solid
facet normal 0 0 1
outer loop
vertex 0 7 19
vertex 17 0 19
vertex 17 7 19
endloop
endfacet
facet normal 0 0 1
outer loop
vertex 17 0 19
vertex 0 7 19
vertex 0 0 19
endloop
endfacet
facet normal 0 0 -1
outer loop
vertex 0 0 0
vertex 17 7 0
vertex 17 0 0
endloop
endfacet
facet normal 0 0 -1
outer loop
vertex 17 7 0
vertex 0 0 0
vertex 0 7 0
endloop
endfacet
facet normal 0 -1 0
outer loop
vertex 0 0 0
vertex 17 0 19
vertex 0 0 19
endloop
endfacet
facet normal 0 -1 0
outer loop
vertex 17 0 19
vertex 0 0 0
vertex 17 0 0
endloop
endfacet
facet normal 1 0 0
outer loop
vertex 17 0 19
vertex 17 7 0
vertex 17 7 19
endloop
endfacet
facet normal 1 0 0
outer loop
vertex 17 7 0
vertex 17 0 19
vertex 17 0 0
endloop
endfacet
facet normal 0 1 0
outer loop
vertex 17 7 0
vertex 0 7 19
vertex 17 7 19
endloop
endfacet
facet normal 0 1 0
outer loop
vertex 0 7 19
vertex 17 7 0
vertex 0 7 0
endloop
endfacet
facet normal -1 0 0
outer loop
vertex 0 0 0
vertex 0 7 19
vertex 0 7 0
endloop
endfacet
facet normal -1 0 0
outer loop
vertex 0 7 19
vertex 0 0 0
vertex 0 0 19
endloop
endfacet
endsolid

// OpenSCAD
// Generated by SolidPython 1.0.1 on 2020-07-29 00:46:56


cube(size = [17, 7, 19]);
/***********************************************
*********      SolidPython code:      **********
************************************************
 
# import packages: SolidPython
from solid import *
from solid.utils import *
from itertools import chain, combinations, permutations


class Resize:

    def __init__(self, scad_file):
        self.scad_file = scad_file
        #self.scad_file = import_scad(scad_file)
        # cone/cylinder param:
        self.r1 = 0
        self.r2 = 0
        self.h = 0
        # rectangular prism param:
        self.w = 0
        self.l = 0
        # ellipse param:
        self.r = 0

    # import OpenScad code (file name corresponds to shape)


    # classify shape + parameters
    def assign(self, param1, param2, param3):
        if self.scad_file == 'cone.scad':
            self.r1 = param1
            self.r2 = param2
            self.h = param3
        elif self.scad_file == 'cylinder.scad':
            self.r1 = param1
            self.r2 = param2
            self.h = param3
        elif self.scad_file == 'rectangularPrism.scad':
            self.h = param1
            self.l = param2
            self.w = param3
        else:
            self.r = param1
            self.h = param2

    # resize parameters
    def iterate(self):
        x = range(3, 20, 2)
        i = 1
        if self.scad_file == 'cone.scad':
            tempList = list(permutations(x, 2))
            for temp in tempList:
                param1 = temp[0]
                param2 = temp[1]
                filepath = 'produced_scad_files/' + 'cone' + str(param1) + '_' + str(param2) + '_' + '.scad'
                scad_render_to_file(cylinder(h=param1, r1=param2, r2=0), filepath)

        elif self.scad_file == 'cylinder.scad':
            tempList = list(permutations(x, 3))
            for temp in tempList:
                param1 = temp[0]
                param2 = temp[1]
                filepath = 'produced_scad_files/' + 'cylinder' + str(param1) + '_' + str(param2) + '_' + '.scad'
                scad_render_to_file(cylinder(h=param1, r1=param2, r2=param2), filepath)

        elif self.scad_file == 'rectangularPrism.scad':
            tempList = list(permutations(x, 3))
            for temp in tempList:
                param1 = temp[0]
                param2 = temp[1]
                param3 = temp[2]
                filepath = 'produced_scad_files/' + 'rectangularPrism' + str(param1) + '_' + str(param2) + '_' + str(
                    param3) + '.scad'
                scad_render_to_file(cube(size=(param1, param2, param3)), filepath)

        elif self.scad_file == 'ellipse.scad':
            tempList = list(permutations(x, 4))
            for temp in tempList:
                param1 = temp[0]
                param2 = temp[1]
                param3 = temp[2]
                param4 = temp[3]
                filepath = 'produced_scad_files/' + 'ellipse' + str(param1) + '_' + str(param2) + '_' + str(param3) + '_' + str(param4) + '.scad'
                scad_render_to_file(scale([param1, param2, param3])(sphere(r=param4)), filepath)

    def render_to_scadfile(self):
        scad_render_to_file(scad, 'example.scad') 
 
************************************************/
